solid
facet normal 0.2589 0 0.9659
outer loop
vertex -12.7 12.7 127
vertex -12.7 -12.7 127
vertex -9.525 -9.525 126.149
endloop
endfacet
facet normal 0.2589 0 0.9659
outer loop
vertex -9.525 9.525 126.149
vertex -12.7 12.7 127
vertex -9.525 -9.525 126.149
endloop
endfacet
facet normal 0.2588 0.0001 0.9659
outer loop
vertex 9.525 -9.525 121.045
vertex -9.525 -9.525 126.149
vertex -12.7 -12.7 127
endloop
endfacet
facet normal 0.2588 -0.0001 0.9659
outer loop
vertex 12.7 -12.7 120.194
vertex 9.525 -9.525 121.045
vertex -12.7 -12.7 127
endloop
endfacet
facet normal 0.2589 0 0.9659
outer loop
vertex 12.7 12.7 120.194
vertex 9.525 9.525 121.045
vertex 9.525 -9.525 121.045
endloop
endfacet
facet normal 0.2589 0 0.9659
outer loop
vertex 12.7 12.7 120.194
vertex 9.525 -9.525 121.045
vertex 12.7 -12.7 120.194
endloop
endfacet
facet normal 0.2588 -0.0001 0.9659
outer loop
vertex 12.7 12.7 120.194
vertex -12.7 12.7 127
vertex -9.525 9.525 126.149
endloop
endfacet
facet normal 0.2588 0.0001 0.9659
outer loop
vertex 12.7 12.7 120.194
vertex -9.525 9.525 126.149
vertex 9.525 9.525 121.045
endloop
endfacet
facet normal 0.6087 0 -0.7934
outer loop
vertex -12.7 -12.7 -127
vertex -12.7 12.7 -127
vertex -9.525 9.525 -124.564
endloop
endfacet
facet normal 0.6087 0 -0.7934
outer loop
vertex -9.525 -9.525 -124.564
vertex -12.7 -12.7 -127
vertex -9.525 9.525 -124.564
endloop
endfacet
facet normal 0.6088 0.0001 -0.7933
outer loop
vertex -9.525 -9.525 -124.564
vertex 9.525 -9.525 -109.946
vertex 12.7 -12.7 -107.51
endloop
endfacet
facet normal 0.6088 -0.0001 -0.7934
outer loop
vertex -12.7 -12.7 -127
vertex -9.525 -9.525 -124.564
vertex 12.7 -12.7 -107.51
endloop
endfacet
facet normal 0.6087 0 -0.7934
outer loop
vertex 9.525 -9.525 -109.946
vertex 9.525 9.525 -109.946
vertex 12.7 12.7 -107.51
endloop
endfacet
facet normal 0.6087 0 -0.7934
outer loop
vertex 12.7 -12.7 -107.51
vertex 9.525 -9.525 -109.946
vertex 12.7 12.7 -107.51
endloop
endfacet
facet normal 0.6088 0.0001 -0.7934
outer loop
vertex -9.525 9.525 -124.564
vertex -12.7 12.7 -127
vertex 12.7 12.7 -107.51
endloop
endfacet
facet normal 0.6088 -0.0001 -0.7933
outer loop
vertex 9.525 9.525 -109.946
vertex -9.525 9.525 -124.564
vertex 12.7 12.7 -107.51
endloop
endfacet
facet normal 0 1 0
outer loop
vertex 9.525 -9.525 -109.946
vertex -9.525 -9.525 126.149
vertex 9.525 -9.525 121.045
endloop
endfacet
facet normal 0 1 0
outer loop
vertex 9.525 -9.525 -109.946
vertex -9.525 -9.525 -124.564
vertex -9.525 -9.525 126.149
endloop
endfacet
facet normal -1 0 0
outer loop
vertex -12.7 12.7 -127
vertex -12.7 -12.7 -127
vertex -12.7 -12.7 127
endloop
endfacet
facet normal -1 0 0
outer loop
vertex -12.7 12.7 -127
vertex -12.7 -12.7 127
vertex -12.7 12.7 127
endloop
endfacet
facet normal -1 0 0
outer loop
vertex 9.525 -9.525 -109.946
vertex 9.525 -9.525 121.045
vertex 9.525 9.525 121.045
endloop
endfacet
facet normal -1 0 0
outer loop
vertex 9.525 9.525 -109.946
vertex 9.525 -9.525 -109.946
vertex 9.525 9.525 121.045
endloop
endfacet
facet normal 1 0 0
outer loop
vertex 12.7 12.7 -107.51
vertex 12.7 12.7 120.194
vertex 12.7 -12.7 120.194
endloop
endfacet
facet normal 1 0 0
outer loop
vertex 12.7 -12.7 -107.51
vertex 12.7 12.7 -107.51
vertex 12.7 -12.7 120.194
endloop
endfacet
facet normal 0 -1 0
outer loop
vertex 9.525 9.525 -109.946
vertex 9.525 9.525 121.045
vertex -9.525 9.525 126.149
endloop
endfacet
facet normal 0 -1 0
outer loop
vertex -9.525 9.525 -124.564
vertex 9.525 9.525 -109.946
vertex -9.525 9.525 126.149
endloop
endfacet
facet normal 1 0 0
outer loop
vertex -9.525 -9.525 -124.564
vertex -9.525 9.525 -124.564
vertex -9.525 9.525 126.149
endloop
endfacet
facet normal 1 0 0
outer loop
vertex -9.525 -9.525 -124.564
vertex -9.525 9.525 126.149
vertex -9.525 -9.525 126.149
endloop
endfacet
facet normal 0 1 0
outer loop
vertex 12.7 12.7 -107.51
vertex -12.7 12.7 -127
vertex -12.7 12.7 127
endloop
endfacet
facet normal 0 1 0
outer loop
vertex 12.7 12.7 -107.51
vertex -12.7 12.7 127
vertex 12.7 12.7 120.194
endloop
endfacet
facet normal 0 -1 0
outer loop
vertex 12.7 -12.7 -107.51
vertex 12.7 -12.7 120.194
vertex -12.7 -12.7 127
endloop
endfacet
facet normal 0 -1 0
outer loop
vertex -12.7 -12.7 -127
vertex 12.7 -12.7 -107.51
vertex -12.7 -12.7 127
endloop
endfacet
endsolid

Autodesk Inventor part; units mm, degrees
ref_plane "YZ Plane" through (0, 0, 0) normal (1, 0, 0) x (0, 1, 0)
ref_plane "XZ Plane" through (0, 0, 0) normal (0, 1, 0) x (-1, 0, 0)
ref_plane "XY Plane" through (0, 0, 0) normal (0, 0, 1) x (1, 0, 0)
sketch "Sketch1" plane through (0, 0, 0) normal (0, 0, 1) x (1, 0, 0)
  line L0 (-17.78, 0) -> (17.78, 0) projected
  line L1 (0, -17.78) -> (0, 17.78) projected
  line L2 (-12.7, 12.7) -> (12.7, 12.7)
  line L3 (12.7, 12.7) -> (12.7, -12.7)
  line L4 (12.7, -12.7) -> (-12.7, -12.7)
  line L5 (-12.7, -12.7) -> (-12.7, 12.7)
  line L6 (9.525, 9.525) -> (-9.525, 9.525)
  line L7 (-9.525, 9.525) -> (-9.525, -9.525)
  line L8 (-9.525, -9.525) -> (9.525, -9.525)
  line L9 (9.525, -9.525) -> (9.525, 9.525)
  point P0 (0, 0)
  point P1 (-12.7, 0)
  point P2 (0, 12.7)
  dimension "d0" = 25.4
  dimension "d1" = 3.175
extrude "Extrusion1" add sketch "Sketch1" along normal mid plane 254 contours L5 L2 L1 L6 L7 L0 | L0 L7 L8 L1 L4 L5 | L1 L8 L9 L0 L3 L4 | L2 L3 L0 L9 L6 L1
sketch "Sketch3" plane through (-12.7, 12.7, 127) normal (0, 1, 0) x (1, 0, 0)
  line L0 (25.4, 0) -> (25.4, 254) projected
  line L1 (25.4, 254) -> (0, 254) projected
  line L2 (0, 254) -> (25.4, 234.5099)
  point P0 (12.7, 127)
  dimension "d7" = 37.5
extrude "Extrusion3" cut sketch "Sketch3" against normal through all
sketch "Sketch4" plane through (-12.7, 12.7, 127) normal (0, 1, 0) x (1, 0, 0)
  line L0 (0, 0) -> (25.4, 0) projected
  line L1 (25.4, 0) -> (25.4, 234.5099) projected
  line L2 (0, 0) -> (25.4, 6.8059)
  point P0 (12.7, 127)
  dimension "d10" = 15
extrude "Extrusion4" cut sketch "Sketch4" against normal through all
properties part number "tubing_template_0.125" material "Aluminum-6061"
